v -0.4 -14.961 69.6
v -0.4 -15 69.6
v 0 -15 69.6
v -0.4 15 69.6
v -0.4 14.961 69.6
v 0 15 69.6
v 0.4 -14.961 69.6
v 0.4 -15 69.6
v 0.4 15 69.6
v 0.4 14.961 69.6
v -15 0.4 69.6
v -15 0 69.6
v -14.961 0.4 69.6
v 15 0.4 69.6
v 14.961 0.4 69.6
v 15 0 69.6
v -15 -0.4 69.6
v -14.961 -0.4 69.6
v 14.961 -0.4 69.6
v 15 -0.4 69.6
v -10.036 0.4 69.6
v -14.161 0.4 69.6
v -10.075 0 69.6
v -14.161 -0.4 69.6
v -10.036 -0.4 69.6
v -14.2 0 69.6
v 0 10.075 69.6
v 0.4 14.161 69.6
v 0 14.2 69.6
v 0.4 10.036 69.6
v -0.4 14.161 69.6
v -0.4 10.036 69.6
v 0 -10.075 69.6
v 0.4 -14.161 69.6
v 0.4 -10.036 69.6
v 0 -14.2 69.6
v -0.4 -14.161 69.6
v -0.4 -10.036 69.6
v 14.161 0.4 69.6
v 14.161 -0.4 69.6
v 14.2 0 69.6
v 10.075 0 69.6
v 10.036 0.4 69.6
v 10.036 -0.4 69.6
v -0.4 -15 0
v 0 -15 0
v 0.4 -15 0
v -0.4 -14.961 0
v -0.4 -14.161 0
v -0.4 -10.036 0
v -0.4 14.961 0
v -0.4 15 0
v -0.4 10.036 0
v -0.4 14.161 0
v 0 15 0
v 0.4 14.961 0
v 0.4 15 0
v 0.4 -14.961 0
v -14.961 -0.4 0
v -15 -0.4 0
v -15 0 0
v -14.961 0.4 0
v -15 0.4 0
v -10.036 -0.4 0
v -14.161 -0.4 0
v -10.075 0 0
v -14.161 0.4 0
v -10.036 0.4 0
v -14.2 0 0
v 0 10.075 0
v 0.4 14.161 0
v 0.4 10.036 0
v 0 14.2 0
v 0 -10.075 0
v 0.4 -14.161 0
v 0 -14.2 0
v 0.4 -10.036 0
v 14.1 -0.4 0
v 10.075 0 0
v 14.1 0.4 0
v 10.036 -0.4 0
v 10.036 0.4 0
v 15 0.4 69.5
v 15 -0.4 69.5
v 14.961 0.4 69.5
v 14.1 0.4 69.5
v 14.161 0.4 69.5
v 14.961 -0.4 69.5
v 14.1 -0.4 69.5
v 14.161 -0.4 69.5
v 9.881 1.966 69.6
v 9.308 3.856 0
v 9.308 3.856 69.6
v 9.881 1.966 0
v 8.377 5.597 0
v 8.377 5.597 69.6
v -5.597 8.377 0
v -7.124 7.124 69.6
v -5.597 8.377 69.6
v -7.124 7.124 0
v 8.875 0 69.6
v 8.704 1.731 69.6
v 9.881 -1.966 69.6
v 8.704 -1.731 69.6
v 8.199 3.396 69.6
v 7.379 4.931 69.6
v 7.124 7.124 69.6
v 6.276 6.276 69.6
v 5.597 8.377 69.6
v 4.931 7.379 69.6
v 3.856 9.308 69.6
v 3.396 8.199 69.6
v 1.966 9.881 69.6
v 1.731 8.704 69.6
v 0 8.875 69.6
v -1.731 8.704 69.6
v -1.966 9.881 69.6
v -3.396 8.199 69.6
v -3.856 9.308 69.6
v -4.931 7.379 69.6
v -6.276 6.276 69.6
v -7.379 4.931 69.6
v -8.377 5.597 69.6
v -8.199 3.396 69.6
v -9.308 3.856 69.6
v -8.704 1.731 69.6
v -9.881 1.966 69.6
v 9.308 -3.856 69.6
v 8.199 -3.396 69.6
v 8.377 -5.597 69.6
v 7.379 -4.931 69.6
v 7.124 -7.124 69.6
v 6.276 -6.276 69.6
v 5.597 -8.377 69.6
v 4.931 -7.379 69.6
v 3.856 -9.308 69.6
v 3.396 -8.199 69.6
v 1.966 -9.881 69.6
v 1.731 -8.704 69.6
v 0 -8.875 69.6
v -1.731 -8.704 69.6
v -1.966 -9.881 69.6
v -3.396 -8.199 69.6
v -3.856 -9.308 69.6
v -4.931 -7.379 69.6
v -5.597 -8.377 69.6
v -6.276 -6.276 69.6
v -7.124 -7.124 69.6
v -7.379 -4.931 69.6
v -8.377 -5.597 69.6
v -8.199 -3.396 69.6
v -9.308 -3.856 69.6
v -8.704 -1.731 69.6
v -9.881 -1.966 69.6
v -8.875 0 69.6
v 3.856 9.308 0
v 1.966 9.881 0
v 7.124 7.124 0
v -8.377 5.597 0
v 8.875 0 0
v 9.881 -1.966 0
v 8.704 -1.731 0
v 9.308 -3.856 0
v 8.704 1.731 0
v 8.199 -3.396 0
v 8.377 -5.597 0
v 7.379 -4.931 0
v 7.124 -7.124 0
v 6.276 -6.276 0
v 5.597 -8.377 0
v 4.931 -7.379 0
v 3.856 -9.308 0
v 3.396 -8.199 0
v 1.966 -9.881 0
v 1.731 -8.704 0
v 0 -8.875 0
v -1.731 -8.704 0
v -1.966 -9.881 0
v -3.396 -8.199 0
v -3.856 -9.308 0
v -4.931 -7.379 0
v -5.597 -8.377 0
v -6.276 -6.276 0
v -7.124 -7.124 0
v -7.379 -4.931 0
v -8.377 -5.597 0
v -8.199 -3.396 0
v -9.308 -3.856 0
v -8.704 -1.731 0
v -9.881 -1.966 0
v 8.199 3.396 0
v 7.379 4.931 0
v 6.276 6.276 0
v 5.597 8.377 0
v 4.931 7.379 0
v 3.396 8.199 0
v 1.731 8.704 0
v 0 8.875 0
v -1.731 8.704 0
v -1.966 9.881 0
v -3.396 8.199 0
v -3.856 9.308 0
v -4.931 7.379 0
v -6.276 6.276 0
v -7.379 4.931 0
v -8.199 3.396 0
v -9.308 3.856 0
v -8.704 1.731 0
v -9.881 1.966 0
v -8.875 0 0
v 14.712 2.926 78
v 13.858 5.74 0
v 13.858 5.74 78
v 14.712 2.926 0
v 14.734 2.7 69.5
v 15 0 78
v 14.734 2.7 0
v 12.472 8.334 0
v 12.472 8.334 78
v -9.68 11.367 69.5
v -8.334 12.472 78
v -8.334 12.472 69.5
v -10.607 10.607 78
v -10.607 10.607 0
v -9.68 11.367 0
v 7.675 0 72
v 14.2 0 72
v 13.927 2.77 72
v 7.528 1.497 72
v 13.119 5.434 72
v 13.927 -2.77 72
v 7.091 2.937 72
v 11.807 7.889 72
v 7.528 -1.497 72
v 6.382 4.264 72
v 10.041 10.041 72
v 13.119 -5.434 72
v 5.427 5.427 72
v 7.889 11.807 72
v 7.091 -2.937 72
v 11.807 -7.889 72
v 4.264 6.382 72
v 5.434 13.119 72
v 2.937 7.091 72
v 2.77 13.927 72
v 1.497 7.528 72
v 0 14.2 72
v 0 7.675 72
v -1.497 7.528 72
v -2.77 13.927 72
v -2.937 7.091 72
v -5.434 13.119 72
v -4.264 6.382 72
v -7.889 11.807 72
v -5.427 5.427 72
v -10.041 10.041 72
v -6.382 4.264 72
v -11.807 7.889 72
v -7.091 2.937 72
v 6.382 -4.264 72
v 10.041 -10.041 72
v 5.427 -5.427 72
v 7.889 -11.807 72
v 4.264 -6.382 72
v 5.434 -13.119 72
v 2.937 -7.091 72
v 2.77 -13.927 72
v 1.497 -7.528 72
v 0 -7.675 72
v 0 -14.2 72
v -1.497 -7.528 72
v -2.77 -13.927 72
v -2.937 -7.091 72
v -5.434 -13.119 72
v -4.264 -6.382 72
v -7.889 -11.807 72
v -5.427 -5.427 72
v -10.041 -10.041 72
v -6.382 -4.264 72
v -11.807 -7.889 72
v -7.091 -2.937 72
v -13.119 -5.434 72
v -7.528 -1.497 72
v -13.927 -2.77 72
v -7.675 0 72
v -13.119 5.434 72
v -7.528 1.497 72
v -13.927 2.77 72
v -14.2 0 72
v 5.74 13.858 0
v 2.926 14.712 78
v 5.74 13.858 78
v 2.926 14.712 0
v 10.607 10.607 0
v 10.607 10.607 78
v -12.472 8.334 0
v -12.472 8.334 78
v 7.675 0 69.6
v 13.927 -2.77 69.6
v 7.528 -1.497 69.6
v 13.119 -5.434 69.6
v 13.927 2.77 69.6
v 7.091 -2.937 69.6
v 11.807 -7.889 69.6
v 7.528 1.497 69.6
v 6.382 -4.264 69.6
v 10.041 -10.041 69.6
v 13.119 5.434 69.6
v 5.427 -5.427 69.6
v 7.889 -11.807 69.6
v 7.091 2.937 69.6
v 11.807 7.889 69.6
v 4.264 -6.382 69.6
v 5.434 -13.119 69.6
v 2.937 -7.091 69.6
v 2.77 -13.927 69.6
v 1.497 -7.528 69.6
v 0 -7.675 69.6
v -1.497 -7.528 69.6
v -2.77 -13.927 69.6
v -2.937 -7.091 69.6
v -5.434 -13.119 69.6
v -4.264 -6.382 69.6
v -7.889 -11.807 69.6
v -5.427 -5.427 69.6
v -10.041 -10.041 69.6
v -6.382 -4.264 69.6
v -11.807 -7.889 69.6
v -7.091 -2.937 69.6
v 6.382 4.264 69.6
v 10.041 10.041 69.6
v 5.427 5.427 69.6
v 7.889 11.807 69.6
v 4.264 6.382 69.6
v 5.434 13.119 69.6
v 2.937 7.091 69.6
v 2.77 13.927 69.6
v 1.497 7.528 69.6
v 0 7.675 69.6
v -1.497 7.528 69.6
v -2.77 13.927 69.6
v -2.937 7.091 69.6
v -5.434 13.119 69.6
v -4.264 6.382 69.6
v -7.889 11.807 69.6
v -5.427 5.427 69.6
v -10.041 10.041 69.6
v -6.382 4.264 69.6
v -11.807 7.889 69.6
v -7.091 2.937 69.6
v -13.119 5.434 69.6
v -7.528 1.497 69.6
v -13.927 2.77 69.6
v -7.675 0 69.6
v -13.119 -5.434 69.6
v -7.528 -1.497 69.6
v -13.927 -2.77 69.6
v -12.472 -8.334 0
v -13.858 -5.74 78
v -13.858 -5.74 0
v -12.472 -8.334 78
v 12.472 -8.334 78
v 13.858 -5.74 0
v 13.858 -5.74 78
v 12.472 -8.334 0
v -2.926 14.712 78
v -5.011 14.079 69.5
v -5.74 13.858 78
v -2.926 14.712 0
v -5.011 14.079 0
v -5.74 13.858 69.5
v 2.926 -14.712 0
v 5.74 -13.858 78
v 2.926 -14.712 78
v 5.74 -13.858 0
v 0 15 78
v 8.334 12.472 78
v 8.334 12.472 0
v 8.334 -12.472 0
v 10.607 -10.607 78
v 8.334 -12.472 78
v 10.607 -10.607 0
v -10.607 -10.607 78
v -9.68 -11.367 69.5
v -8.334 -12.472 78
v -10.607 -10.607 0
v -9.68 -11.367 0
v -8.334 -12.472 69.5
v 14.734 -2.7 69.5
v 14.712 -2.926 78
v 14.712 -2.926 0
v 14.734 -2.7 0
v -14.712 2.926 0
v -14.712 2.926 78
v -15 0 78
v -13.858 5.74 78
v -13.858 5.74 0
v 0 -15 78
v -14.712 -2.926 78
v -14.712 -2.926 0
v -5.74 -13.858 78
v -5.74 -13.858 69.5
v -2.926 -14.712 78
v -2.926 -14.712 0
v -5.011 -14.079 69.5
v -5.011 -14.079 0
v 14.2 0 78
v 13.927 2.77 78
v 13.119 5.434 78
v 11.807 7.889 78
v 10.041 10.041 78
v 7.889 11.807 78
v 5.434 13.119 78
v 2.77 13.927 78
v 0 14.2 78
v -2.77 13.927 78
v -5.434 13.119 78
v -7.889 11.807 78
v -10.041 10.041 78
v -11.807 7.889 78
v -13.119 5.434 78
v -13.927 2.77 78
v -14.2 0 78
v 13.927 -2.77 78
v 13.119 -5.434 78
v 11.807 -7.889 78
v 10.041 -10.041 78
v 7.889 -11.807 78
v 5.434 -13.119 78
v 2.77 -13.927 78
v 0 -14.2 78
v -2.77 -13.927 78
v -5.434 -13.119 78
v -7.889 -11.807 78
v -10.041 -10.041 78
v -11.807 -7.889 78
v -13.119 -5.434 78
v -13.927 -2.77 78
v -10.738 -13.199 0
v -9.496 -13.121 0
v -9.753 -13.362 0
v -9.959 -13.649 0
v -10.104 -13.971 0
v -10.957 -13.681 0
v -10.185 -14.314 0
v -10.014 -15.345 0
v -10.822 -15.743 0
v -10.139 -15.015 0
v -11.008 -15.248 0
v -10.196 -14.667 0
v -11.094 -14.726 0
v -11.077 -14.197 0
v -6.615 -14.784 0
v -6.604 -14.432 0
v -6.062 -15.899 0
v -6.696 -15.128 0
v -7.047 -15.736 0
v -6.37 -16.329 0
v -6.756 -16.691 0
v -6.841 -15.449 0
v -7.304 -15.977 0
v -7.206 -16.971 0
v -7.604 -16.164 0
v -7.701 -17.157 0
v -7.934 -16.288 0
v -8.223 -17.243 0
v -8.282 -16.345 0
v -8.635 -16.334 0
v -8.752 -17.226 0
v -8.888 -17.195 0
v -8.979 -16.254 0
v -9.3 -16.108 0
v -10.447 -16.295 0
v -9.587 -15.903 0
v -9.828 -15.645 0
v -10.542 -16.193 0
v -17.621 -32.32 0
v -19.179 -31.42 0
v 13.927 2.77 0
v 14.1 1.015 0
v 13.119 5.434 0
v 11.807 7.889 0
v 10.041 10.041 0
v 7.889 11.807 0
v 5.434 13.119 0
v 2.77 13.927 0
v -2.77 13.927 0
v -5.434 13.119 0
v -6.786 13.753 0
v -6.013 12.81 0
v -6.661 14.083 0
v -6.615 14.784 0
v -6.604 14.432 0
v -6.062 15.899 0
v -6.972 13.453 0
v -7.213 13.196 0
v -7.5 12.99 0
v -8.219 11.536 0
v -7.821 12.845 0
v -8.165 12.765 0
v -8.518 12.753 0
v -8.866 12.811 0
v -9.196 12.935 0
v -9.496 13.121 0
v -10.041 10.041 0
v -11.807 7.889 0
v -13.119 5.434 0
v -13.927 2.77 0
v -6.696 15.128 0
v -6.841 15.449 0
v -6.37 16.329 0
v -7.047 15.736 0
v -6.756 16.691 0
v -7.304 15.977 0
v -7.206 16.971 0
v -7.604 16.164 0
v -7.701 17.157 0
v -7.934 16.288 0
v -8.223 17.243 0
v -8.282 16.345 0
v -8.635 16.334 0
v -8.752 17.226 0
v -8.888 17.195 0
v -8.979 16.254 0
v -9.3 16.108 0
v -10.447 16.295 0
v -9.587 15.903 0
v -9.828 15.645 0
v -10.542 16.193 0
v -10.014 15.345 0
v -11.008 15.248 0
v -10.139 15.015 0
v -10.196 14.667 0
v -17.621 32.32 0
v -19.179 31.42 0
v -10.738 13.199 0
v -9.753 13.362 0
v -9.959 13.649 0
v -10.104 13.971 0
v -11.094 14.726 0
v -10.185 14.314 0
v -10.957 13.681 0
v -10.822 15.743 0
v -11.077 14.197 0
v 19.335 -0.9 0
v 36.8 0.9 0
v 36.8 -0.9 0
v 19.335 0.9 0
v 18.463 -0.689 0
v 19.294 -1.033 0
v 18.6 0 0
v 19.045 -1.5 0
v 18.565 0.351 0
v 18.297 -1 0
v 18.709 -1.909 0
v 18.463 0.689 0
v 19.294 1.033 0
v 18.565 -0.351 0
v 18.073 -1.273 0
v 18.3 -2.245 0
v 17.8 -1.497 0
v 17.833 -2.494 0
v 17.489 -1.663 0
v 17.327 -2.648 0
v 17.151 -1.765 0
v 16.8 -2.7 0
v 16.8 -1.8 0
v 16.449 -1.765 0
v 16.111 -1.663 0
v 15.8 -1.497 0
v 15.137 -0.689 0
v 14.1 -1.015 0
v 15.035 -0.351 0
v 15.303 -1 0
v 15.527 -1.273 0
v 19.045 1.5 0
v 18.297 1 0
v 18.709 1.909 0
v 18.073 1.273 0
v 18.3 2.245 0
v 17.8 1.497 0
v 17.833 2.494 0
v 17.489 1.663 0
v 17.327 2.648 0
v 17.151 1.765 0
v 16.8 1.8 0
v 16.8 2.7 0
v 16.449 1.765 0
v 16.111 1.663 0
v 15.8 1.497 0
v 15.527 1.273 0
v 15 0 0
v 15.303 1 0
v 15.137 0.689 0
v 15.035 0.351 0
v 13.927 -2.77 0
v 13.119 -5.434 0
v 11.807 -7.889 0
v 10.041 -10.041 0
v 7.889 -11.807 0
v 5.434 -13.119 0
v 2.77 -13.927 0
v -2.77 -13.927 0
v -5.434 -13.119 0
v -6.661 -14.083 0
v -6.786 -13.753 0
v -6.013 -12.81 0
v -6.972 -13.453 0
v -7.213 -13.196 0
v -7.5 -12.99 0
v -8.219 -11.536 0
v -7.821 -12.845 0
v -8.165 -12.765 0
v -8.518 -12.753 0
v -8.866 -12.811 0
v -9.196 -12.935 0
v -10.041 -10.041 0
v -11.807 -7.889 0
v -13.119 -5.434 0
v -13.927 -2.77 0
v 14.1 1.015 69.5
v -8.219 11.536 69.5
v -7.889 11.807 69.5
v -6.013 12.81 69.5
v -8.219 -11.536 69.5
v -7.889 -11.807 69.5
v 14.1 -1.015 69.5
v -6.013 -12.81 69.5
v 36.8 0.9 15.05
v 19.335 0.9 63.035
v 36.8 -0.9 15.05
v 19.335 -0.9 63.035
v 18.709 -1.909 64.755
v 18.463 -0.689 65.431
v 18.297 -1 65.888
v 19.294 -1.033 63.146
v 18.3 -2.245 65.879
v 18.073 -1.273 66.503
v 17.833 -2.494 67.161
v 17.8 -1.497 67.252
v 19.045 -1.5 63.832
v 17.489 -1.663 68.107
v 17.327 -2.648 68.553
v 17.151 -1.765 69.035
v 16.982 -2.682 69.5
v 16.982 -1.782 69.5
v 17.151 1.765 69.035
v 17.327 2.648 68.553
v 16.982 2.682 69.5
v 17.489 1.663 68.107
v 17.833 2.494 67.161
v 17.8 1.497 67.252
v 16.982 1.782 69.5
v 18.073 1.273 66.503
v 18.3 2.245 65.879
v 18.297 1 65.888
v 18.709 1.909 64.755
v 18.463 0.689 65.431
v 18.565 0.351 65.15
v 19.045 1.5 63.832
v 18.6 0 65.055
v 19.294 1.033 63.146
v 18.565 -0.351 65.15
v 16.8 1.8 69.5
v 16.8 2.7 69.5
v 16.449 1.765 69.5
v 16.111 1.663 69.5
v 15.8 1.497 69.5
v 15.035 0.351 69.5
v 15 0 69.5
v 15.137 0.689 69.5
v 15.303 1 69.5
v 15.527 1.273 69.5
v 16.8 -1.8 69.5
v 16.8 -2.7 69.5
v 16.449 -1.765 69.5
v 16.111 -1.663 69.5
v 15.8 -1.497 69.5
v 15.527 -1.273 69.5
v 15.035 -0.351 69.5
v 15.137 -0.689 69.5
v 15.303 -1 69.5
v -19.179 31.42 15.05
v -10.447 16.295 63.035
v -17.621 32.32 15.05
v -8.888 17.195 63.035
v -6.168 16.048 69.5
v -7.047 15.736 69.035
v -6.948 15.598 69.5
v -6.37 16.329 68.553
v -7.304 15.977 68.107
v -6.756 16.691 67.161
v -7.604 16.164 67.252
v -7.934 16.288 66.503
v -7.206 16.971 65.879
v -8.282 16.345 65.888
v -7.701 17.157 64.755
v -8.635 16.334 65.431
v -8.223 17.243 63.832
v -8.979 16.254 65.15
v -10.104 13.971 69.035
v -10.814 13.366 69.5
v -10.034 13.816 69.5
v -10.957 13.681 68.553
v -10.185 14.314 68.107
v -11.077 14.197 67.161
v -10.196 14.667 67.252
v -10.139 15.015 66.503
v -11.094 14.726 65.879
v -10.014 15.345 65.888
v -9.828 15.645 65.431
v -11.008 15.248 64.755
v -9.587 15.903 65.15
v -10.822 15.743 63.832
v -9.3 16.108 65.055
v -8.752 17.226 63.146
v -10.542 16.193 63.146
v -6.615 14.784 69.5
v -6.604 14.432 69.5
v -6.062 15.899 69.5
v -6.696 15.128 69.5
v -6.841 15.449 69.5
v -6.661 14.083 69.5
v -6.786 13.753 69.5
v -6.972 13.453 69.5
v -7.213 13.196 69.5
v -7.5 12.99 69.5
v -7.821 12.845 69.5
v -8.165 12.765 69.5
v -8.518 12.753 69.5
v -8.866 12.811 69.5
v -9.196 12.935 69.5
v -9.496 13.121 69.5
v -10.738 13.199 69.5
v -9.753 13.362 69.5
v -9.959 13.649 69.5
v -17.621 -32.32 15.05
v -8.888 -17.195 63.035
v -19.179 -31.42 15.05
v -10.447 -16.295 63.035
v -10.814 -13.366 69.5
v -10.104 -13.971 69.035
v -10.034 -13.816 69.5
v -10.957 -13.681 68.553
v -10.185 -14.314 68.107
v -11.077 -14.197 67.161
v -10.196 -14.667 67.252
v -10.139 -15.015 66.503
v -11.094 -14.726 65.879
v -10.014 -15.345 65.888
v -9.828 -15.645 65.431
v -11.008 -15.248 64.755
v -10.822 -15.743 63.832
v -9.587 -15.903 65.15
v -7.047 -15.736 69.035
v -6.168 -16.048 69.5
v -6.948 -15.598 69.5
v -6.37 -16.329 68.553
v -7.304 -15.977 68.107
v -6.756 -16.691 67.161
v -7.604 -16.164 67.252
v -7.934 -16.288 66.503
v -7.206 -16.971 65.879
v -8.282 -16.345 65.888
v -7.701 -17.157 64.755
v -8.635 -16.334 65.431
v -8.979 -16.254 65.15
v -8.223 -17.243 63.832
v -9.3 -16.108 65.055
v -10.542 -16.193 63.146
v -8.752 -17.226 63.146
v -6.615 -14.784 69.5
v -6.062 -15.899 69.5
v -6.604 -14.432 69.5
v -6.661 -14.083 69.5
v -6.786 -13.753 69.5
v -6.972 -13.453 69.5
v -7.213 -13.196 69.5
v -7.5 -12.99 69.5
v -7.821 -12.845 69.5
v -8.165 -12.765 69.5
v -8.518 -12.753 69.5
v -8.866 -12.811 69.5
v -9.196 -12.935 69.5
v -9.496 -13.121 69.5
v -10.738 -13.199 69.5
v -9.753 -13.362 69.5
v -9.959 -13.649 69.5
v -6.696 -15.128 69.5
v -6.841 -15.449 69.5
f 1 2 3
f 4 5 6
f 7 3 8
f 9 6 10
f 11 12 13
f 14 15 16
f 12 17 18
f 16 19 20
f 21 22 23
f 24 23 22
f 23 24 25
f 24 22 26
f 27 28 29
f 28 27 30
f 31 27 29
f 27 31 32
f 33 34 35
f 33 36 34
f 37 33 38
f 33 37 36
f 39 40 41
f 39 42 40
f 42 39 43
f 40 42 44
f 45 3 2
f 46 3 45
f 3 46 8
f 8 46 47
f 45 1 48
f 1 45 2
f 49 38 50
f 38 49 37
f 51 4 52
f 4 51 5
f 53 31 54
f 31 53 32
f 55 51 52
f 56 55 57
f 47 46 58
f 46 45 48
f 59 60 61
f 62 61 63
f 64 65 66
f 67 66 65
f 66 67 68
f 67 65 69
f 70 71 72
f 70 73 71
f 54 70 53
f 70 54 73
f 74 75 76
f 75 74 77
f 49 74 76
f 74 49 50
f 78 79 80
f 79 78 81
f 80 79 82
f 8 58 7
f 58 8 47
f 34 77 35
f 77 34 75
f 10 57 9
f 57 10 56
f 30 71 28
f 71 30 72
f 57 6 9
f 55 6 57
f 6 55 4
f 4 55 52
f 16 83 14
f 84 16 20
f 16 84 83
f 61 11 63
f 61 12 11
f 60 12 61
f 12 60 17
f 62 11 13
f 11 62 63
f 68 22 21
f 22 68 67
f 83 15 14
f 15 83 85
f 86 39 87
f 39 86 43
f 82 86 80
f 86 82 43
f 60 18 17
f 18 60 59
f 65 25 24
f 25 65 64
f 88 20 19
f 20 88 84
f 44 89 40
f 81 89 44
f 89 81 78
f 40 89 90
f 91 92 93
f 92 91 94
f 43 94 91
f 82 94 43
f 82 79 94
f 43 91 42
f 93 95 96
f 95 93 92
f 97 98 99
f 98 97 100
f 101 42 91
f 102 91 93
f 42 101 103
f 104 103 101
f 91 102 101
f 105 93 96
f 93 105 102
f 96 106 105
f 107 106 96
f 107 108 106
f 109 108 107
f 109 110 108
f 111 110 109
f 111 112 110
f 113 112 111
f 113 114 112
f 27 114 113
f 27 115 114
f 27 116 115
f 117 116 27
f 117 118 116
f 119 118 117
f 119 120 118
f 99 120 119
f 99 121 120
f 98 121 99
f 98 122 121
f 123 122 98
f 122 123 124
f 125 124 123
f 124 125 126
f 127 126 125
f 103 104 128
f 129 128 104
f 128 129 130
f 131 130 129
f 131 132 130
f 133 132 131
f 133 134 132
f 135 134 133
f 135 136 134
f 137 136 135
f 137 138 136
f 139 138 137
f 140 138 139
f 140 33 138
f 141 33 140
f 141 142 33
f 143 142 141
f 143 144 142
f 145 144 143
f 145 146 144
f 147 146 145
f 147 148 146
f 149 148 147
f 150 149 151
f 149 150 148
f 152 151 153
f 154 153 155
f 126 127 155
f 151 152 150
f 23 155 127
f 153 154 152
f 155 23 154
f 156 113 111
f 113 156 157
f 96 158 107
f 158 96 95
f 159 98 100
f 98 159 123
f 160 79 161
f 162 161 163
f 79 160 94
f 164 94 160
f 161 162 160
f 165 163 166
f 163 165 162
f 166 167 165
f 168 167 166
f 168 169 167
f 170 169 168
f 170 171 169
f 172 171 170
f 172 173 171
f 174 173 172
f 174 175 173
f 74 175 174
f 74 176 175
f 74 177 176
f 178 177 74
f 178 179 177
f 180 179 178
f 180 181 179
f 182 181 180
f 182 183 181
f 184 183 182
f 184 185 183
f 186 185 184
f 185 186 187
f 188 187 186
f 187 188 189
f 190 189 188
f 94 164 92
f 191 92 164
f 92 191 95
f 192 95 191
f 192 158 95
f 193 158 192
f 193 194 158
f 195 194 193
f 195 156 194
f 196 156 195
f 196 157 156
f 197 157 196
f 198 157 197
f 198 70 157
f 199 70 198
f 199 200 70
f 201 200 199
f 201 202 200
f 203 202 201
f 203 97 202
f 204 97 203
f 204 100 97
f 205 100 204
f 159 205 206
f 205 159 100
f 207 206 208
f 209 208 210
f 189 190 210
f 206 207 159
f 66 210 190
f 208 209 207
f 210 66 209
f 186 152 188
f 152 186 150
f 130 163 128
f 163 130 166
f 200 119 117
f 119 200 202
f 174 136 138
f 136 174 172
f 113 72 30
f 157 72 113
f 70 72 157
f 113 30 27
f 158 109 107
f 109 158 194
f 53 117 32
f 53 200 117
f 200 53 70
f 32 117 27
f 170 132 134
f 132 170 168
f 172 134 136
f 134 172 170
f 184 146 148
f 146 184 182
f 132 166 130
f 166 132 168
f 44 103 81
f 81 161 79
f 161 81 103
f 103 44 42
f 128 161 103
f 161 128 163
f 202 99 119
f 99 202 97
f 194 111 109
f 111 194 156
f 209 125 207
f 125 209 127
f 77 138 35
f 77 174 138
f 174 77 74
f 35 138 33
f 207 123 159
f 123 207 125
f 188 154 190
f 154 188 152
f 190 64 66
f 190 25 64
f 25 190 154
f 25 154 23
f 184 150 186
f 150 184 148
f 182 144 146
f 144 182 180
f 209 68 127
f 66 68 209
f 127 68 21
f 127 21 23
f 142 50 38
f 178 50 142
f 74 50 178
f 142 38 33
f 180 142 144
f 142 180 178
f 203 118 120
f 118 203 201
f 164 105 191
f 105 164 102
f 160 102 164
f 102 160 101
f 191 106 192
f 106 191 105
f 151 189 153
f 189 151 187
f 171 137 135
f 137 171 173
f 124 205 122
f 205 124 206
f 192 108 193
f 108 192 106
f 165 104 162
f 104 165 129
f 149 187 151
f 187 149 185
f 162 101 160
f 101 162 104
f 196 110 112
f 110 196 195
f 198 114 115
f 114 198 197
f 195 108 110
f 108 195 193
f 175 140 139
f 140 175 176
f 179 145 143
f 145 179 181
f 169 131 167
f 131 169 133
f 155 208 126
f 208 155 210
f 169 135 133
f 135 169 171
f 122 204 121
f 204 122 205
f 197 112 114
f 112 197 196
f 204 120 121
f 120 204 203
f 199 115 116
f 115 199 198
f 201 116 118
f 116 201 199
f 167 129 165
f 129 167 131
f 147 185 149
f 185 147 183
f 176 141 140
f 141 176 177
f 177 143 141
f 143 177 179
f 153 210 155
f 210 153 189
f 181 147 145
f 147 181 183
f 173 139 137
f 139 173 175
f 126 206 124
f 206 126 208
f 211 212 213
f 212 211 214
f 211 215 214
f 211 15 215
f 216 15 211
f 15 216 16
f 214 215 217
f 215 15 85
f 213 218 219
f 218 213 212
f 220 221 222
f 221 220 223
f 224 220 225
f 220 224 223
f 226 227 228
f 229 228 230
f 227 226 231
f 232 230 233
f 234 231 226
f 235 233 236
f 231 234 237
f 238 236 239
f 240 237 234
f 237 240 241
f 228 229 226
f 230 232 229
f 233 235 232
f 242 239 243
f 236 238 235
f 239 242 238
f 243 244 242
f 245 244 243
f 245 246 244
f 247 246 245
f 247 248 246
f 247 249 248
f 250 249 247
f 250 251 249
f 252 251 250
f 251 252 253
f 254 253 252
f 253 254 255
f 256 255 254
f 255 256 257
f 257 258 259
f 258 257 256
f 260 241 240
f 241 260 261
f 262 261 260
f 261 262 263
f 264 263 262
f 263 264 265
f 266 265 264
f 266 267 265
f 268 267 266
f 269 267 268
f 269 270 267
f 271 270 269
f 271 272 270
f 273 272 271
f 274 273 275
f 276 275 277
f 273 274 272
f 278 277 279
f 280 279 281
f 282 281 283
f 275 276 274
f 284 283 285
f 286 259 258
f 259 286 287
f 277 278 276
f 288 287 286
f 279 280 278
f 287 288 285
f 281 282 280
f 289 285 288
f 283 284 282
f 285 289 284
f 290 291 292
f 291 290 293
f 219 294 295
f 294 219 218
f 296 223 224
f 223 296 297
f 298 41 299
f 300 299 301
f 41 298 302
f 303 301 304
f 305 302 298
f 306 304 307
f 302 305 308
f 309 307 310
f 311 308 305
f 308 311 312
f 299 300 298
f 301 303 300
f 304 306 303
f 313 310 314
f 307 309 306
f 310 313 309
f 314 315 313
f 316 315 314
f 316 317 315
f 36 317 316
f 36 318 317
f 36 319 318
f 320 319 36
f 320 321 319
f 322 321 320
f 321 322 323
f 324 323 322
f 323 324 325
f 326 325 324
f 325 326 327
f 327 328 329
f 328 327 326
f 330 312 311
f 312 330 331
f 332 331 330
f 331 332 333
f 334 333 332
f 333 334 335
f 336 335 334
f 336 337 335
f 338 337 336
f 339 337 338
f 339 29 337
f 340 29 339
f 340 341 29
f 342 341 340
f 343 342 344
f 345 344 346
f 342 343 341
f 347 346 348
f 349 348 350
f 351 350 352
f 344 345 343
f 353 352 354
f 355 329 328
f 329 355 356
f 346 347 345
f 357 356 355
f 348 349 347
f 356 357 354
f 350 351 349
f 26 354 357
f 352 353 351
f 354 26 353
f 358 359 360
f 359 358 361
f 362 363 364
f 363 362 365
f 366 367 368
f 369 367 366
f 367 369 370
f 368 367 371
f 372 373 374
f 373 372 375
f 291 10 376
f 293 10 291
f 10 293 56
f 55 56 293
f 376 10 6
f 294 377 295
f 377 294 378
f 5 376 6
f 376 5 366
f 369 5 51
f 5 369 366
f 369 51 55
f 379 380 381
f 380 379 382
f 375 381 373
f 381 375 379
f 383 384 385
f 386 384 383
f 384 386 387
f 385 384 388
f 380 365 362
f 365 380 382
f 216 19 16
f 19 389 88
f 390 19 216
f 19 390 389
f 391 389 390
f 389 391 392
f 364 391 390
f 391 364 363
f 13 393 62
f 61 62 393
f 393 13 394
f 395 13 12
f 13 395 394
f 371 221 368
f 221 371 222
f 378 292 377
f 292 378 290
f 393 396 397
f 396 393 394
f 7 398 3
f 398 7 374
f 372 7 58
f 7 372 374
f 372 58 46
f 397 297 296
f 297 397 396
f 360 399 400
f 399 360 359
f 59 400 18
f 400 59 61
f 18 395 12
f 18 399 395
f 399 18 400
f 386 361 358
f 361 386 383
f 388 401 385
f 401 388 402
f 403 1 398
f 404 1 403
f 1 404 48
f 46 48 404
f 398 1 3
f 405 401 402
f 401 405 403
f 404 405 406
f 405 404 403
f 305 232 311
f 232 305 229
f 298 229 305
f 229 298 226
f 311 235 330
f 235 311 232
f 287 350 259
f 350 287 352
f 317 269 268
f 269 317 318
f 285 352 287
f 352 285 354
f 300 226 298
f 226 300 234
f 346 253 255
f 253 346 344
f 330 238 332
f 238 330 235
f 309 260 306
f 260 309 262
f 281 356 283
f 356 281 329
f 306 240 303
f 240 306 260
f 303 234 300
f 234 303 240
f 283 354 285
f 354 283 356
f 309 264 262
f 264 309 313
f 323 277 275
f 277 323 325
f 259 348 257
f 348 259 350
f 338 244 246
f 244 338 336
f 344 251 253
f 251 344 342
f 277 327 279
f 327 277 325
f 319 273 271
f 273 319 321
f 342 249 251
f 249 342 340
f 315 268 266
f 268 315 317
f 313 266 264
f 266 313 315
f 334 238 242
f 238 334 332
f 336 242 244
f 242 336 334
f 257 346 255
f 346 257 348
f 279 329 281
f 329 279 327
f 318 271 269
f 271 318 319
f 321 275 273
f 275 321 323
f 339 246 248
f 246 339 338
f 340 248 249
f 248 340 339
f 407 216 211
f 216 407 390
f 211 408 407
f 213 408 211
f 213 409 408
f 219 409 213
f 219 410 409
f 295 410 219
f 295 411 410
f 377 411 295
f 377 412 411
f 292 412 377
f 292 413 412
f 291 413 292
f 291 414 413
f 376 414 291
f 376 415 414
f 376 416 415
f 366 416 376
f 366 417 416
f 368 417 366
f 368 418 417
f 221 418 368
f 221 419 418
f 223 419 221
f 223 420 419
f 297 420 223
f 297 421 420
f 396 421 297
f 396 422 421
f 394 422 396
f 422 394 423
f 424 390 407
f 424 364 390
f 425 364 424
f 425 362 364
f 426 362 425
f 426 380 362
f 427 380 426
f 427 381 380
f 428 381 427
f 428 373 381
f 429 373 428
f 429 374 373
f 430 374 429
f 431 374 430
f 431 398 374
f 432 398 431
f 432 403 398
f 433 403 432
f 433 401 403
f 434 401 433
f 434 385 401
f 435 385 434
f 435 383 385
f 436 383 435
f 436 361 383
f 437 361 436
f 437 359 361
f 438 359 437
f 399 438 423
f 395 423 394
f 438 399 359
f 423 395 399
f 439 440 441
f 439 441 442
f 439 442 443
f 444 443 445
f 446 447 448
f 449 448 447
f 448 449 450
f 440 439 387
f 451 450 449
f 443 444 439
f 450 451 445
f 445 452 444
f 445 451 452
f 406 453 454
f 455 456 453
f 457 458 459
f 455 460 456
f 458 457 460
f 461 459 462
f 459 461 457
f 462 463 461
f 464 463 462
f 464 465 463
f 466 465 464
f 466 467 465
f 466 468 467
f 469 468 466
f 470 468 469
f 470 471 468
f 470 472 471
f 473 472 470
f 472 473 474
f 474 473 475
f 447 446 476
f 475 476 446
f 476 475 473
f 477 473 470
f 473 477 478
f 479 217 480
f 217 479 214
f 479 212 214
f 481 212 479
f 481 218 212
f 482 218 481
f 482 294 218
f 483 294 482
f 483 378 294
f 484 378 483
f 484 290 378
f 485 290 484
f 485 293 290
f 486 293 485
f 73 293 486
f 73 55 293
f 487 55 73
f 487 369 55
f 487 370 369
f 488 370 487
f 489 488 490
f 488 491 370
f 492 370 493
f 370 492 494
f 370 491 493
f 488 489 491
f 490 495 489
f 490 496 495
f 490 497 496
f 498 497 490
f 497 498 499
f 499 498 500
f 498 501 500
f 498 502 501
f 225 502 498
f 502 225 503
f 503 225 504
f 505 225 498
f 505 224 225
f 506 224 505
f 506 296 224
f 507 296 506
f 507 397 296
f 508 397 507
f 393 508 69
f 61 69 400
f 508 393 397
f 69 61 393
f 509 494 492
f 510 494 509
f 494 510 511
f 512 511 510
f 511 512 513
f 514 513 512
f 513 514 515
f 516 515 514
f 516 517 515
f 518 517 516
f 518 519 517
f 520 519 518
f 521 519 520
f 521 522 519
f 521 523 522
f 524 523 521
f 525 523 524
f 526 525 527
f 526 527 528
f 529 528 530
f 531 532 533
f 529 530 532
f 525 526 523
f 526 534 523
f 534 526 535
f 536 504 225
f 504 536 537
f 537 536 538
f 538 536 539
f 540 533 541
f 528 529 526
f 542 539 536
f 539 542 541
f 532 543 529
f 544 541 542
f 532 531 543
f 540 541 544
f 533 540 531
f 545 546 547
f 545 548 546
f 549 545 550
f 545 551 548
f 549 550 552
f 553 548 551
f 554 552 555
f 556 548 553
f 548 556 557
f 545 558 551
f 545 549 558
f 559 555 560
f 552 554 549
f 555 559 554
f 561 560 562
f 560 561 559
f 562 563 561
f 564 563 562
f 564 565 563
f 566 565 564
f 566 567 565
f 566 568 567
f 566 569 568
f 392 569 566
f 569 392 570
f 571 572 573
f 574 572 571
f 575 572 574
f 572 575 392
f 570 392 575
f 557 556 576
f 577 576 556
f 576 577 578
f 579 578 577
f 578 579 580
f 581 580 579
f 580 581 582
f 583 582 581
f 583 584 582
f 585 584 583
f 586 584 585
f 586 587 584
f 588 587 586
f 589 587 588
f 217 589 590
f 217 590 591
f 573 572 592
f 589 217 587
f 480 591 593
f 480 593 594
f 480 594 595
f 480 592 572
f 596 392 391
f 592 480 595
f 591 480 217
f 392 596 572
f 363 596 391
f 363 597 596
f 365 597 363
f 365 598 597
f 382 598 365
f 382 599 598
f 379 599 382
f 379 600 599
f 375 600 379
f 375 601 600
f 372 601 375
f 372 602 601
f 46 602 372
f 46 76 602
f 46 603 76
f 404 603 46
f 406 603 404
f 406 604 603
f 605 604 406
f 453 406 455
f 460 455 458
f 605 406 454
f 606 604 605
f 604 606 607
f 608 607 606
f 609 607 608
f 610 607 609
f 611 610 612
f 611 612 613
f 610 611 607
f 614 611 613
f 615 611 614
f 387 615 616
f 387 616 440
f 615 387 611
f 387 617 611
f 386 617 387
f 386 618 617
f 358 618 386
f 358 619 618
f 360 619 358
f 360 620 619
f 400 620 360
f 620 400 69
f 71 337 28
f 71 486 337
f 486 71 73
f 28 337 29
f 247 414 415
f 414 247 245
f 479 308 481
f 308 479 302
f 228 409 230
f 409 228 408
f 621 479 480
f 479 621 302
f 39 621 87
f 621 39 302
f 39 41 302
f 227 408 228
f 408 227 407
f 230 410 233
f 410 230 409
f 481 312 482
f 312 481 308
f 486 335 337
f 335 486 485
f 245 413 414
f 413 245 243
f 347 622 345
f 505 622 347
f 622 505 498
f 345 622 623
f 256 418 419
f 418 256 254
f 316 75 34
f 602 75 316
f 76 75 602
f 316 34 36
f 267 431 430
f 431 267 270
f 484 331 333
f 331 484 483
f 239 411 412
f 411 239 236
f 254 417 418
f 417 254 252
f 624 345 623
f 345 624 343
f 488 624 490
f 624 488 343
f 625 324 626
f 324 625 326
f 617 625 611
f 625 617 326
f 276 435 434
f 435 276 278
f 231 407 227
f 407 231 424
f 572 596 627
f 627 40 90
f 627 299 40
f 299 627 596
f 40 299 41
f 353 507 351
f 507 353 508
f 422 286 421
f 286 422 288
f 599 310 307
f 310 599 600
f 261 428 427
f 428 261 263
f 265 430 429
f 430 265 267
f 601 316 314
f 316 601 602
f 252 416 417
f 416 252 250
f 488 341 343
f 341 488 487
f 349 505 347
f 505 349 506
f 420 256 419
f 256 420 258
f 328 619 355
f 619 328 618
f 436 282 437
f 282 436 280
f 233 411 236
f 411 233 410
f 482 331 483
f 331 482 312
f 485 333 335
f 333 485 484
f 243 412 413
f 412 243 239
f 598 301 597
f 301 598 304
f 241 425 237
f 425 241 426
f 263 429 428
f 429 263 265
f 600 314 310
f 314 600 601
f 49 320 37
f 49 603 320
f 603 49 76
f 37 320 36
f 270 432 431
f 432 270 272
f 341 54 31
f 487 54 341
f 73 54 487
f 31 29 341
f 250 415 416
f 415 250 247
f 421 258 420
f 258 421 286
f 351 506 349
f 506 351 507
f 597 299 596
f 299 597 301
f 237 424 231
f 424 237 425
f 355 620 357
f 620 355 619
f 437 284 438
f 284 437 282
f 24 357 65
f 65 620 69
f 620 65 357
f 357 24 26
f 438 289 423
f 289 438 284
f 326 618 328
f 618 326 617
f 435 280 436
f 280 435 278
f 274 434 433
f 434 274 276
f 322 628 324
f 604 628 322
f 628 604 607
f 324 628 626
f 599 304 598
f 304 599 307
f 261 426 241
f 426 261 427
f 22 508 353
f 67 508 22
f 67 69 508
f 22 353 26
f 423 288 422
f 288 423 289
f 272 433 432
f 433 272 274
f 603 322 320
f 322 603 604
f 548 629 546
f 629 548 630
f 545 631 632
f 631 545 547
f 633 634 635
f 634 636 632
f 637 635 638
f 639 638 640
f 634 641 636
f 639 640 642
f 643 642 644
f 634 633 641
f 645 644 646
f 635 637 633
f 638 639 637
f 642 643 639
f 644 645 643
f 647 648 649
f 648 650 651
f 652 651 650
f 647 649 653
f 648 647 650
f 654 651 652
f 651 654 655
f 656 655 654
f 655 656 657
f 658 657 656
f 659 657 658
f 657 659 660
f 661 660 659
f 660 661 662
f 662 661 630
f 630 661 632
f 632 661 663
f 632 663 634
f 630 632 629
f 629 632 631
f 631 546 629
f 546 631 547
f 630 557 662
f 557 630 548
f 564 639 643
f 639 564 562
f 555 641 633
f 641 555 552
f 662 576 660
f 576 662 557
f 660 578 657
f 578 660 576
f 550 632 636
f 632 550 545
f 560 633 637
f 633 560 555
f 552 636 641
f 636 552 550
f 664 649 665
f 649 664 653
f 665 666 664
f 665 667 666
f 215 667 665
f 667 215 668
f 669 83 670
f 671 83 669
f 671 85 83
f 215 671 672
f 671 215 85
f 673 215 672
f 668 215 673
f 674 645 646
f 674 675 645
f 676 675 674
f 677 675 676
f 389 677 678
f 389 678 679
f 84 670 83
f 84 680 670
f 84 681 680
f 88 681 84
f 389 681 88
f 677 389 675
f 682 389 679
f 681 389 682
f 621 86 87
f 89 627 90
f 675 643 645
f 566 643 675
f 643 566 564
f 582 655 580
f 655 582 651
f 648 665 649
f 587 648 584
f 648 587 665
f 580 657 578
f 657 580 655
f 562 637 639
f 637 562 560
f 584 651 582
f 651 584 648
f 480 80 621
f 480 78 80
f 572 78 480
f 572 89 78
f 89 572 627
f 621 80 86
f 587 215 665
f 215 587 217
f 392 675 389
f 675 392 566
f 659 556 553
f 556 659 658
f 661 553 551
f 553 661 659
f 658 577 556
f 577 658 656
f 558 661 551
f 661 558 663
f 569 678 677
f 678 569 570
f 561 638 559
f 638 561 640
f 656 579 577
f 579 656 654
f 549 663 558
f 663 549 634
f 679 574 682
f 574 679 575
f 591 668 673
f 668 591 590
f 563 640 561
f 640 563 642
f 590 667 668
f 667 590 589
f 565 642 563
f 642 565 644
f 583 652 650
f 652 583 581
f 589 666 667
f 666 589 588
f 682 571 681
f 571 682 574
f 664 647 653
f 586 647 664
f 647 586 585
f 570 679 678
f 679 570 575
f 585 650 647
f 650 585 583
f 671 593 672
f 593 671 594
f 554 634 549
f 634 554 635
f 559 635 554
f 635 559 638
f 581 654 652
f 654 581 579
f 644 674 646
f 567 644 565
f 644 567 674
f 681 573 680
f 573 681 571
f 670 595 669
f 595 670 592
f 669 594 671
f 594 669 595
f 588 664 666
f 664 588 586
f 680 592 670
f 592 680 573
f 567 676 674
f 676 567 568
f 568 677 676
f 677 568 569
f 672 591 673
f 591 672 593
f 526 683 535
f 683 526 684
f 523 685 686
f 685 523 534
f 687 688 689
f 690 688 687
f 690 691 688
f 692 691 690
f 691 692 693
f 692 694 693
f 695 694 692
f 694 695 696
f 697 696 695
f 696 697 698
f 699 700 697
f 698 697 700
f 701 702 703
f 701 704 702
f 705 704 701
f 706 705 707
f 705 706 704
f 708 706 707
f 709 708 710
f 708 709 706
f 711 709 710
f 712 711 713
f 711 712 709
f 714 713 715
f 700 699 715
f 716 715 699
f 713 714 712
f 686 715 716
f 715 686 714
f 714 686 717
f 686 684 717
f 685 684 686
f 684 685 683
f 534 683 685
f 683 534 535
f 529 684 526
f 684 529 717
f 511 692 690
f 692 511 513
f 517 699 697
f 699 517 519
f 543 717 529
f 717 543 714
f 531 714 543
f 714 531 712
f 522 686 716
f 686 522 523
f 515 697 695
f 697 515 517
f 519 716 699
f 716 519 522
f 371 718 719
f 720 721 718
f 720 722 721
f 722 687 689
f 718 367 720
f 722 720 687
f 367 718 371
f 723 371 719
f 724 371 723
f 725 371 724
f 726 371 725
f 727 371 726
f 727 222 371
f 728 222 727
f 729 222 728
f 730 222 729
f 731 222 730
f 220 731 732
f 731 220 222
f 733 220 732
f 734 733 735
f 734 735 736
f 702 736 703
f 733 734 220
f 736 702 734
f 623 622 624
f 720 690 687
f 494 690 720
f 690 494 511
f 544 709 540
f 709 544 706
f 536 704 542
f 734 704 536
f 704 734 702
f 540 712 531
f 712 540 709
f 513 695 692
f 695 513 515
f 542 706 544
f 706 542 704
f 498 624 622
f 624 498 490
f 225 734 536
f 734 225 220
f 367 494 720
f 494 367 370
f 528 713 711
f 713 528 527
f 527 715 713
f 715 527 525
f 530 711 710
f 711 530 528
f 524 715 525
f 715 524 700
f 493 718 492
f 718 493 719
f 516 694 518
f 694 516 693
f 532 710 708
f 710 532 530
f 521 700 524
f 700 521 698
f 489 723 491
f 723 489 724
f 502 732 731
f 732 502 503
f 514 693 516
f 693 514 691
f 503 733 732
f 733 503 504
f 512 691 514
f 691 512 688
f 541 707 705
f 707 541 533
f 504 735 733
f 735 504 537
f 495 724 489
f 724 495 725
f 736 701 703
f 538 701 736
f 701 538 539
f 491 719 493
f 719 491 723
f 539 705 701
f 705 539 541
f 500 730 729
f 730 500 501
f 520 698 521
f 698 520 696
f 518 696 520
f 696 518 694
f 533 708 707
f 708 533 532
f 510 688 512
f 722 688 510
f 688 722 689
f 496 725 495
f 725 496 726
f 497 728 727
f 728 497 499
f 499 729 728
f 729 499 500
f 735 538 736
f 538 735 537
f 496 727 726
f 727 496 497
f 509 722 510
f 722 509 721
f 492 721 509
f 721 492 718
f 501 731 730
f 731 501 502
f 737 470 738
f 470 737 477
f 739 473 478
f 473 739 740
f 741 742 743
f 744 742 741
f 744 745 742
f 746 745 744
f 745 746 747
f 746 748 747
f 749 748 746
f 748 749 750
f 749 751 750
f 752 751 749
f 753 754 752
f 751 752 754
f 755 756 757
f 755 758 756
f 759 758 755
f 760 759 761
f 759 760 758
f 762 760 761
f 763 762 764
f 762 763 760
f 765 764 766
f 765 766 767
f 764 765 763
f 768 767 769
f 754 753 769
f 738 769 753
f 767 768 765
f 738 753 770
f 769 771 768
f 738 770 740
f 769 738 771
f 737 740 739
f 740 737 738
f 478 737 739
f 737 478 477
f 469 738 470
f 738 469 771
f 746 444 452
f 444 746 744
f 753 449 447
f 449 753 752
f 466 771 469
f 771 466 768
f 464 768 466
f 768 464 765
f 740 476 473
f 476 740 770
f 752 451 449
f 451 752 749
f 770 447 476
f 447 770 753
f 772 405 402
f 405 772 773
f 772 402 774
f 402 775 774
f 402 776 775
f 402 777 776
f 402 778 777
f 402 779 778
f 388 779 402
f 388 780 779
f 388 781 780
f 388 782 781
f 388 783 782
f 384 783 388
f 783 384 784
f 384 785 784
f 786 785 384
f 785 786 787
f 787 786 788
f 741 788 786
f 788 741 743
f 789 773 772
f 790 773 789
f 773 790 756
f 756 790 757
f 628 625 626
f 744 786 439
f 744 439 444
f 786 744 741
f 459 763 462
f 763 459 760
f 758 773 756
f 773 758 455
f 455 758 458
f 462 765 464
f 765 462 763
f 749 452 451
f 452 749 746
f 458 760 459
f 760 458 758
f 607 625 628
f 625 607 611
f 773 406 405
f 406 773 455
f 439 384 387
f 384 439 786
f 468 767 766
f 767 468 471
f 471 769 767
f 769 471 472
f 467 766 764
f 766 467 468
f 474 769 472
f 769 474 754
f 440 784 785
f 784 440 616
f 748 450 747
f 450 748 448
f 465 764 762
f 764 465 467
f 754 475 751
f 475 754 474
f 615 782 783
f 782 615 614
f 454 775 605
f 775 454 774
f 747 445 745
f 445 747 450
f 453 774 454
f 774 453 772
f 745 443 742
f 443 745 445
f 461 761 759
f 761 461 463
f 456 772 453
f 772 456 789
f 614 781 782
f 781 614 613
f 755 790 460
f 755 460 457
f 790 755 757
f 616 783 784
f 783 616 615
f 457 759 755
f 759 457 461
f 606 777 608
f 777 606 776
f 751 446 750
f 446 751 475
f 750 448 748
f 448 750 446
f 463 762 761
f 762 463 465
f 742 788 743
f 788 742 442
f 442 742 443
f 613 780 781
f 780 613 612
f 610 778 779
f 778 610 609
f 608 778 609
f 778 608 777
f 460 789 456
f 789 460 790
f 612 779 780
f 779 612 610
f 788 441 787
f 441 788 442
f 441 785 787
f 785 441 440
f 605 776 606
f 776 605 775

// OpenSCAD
$fn=32;

wall            = 0.8;

fin_number      = 3;

rocket_diameter = 30;
rocket_length   = 78;

engine_diameter = 17.75;
engine_length   = 69.6;
engine_wall     = 2.4;

fin_angle       = 20;
fin_length      = 20;
fin_width       = 1.8;
fin_height      = 70;

guide_diameter  = 3.6;


engine_case();
rocket_case();
create_fins() fin();

module fin(fl=fin_length,
           fa=fin_angle,
           fw=fin_width,
           fh=fin_height,
           gd=guide_diameter)
{
    fh1=fl/tan(fa);
    
    difference(){
        union(){
            //guidance pipes
            cylinder(h=fh-0.5,d=gd+fw);
            translate([-(gd+fw)/2,-(gd+fw)/2,0])
                cube([(gd+fw)/2,gd+fw,fh-0.5]);
            translate([0,fw/2,0]){
                rotate([90,0,0]){
                    // top triangle of fin
                    linear_extrude(height = fw){
                        translate([0,max(fh-fh1,0),0])
                        polygon(points = [[0,0],[fl,0],[0,min(fh,fh1)]],
                                paths  = [[0,1,2]]);
                    }
                    
                    // bottom square of trangle
                    cube([fl,max(fh-fh1,0),fw]);
                }
            }
        }
        union(){
            rotate([90,0,0]){
                #linear_extrude(height = gd+2*fw, center=true){
                    translate([0,max(fh-fh1,0),0])
                        polygon(points = [[fl,0],[fl,min(fh,fh1)],[0,min(fh,fh1)]],
                                paths  = [[0,1,2]]);
                }
            }
            // hole for guidance
            cylinder(h=fh,d=gd);
        }
        
    }
}


module create_fins(rd=rocket_diameter,
                   fn=fin_number,
                   w=wall,
                   gd=guide_diameter)
{
    for (azimuth =[0:360/fn:359])
        rotate([0,0,azimuth])
            translate([(rd+gd)/2,0,0])
                children(0);
}


module rocket_case(rd=rocket_diameter,
                   rl=rocket_length)
{
    difference(){
        cylinder(h=rl,d=rd);
        cylinder(h=rl,d=rd-2*wall);
    }
}


module engine_case(ed=engine_diameter,
                   el=engine_length,
                   rd=rocket_diameter,
                   ew=engine_wall,
                   w=wall)
{
    // engine chamber
    difference(){
        union(){
            // main rocket engine chamber
            cylinder(h=el,d=ed+ew);
            // connectors to rocket
            translate([0,0,el/2]){
                rotate([0,0,90])
                    cube([rd,wall,el], center=true);
                cube([rd,wall,el], center=true);
            }
        }
        cylinder(h=el,d=ed);
    }

    // top lid
    translate([0,0,el]){
        difference(){
            cylinder(h=ew,d=rd);
            cylinder(h=ew,d=ed-ew);
        }
    }
}
